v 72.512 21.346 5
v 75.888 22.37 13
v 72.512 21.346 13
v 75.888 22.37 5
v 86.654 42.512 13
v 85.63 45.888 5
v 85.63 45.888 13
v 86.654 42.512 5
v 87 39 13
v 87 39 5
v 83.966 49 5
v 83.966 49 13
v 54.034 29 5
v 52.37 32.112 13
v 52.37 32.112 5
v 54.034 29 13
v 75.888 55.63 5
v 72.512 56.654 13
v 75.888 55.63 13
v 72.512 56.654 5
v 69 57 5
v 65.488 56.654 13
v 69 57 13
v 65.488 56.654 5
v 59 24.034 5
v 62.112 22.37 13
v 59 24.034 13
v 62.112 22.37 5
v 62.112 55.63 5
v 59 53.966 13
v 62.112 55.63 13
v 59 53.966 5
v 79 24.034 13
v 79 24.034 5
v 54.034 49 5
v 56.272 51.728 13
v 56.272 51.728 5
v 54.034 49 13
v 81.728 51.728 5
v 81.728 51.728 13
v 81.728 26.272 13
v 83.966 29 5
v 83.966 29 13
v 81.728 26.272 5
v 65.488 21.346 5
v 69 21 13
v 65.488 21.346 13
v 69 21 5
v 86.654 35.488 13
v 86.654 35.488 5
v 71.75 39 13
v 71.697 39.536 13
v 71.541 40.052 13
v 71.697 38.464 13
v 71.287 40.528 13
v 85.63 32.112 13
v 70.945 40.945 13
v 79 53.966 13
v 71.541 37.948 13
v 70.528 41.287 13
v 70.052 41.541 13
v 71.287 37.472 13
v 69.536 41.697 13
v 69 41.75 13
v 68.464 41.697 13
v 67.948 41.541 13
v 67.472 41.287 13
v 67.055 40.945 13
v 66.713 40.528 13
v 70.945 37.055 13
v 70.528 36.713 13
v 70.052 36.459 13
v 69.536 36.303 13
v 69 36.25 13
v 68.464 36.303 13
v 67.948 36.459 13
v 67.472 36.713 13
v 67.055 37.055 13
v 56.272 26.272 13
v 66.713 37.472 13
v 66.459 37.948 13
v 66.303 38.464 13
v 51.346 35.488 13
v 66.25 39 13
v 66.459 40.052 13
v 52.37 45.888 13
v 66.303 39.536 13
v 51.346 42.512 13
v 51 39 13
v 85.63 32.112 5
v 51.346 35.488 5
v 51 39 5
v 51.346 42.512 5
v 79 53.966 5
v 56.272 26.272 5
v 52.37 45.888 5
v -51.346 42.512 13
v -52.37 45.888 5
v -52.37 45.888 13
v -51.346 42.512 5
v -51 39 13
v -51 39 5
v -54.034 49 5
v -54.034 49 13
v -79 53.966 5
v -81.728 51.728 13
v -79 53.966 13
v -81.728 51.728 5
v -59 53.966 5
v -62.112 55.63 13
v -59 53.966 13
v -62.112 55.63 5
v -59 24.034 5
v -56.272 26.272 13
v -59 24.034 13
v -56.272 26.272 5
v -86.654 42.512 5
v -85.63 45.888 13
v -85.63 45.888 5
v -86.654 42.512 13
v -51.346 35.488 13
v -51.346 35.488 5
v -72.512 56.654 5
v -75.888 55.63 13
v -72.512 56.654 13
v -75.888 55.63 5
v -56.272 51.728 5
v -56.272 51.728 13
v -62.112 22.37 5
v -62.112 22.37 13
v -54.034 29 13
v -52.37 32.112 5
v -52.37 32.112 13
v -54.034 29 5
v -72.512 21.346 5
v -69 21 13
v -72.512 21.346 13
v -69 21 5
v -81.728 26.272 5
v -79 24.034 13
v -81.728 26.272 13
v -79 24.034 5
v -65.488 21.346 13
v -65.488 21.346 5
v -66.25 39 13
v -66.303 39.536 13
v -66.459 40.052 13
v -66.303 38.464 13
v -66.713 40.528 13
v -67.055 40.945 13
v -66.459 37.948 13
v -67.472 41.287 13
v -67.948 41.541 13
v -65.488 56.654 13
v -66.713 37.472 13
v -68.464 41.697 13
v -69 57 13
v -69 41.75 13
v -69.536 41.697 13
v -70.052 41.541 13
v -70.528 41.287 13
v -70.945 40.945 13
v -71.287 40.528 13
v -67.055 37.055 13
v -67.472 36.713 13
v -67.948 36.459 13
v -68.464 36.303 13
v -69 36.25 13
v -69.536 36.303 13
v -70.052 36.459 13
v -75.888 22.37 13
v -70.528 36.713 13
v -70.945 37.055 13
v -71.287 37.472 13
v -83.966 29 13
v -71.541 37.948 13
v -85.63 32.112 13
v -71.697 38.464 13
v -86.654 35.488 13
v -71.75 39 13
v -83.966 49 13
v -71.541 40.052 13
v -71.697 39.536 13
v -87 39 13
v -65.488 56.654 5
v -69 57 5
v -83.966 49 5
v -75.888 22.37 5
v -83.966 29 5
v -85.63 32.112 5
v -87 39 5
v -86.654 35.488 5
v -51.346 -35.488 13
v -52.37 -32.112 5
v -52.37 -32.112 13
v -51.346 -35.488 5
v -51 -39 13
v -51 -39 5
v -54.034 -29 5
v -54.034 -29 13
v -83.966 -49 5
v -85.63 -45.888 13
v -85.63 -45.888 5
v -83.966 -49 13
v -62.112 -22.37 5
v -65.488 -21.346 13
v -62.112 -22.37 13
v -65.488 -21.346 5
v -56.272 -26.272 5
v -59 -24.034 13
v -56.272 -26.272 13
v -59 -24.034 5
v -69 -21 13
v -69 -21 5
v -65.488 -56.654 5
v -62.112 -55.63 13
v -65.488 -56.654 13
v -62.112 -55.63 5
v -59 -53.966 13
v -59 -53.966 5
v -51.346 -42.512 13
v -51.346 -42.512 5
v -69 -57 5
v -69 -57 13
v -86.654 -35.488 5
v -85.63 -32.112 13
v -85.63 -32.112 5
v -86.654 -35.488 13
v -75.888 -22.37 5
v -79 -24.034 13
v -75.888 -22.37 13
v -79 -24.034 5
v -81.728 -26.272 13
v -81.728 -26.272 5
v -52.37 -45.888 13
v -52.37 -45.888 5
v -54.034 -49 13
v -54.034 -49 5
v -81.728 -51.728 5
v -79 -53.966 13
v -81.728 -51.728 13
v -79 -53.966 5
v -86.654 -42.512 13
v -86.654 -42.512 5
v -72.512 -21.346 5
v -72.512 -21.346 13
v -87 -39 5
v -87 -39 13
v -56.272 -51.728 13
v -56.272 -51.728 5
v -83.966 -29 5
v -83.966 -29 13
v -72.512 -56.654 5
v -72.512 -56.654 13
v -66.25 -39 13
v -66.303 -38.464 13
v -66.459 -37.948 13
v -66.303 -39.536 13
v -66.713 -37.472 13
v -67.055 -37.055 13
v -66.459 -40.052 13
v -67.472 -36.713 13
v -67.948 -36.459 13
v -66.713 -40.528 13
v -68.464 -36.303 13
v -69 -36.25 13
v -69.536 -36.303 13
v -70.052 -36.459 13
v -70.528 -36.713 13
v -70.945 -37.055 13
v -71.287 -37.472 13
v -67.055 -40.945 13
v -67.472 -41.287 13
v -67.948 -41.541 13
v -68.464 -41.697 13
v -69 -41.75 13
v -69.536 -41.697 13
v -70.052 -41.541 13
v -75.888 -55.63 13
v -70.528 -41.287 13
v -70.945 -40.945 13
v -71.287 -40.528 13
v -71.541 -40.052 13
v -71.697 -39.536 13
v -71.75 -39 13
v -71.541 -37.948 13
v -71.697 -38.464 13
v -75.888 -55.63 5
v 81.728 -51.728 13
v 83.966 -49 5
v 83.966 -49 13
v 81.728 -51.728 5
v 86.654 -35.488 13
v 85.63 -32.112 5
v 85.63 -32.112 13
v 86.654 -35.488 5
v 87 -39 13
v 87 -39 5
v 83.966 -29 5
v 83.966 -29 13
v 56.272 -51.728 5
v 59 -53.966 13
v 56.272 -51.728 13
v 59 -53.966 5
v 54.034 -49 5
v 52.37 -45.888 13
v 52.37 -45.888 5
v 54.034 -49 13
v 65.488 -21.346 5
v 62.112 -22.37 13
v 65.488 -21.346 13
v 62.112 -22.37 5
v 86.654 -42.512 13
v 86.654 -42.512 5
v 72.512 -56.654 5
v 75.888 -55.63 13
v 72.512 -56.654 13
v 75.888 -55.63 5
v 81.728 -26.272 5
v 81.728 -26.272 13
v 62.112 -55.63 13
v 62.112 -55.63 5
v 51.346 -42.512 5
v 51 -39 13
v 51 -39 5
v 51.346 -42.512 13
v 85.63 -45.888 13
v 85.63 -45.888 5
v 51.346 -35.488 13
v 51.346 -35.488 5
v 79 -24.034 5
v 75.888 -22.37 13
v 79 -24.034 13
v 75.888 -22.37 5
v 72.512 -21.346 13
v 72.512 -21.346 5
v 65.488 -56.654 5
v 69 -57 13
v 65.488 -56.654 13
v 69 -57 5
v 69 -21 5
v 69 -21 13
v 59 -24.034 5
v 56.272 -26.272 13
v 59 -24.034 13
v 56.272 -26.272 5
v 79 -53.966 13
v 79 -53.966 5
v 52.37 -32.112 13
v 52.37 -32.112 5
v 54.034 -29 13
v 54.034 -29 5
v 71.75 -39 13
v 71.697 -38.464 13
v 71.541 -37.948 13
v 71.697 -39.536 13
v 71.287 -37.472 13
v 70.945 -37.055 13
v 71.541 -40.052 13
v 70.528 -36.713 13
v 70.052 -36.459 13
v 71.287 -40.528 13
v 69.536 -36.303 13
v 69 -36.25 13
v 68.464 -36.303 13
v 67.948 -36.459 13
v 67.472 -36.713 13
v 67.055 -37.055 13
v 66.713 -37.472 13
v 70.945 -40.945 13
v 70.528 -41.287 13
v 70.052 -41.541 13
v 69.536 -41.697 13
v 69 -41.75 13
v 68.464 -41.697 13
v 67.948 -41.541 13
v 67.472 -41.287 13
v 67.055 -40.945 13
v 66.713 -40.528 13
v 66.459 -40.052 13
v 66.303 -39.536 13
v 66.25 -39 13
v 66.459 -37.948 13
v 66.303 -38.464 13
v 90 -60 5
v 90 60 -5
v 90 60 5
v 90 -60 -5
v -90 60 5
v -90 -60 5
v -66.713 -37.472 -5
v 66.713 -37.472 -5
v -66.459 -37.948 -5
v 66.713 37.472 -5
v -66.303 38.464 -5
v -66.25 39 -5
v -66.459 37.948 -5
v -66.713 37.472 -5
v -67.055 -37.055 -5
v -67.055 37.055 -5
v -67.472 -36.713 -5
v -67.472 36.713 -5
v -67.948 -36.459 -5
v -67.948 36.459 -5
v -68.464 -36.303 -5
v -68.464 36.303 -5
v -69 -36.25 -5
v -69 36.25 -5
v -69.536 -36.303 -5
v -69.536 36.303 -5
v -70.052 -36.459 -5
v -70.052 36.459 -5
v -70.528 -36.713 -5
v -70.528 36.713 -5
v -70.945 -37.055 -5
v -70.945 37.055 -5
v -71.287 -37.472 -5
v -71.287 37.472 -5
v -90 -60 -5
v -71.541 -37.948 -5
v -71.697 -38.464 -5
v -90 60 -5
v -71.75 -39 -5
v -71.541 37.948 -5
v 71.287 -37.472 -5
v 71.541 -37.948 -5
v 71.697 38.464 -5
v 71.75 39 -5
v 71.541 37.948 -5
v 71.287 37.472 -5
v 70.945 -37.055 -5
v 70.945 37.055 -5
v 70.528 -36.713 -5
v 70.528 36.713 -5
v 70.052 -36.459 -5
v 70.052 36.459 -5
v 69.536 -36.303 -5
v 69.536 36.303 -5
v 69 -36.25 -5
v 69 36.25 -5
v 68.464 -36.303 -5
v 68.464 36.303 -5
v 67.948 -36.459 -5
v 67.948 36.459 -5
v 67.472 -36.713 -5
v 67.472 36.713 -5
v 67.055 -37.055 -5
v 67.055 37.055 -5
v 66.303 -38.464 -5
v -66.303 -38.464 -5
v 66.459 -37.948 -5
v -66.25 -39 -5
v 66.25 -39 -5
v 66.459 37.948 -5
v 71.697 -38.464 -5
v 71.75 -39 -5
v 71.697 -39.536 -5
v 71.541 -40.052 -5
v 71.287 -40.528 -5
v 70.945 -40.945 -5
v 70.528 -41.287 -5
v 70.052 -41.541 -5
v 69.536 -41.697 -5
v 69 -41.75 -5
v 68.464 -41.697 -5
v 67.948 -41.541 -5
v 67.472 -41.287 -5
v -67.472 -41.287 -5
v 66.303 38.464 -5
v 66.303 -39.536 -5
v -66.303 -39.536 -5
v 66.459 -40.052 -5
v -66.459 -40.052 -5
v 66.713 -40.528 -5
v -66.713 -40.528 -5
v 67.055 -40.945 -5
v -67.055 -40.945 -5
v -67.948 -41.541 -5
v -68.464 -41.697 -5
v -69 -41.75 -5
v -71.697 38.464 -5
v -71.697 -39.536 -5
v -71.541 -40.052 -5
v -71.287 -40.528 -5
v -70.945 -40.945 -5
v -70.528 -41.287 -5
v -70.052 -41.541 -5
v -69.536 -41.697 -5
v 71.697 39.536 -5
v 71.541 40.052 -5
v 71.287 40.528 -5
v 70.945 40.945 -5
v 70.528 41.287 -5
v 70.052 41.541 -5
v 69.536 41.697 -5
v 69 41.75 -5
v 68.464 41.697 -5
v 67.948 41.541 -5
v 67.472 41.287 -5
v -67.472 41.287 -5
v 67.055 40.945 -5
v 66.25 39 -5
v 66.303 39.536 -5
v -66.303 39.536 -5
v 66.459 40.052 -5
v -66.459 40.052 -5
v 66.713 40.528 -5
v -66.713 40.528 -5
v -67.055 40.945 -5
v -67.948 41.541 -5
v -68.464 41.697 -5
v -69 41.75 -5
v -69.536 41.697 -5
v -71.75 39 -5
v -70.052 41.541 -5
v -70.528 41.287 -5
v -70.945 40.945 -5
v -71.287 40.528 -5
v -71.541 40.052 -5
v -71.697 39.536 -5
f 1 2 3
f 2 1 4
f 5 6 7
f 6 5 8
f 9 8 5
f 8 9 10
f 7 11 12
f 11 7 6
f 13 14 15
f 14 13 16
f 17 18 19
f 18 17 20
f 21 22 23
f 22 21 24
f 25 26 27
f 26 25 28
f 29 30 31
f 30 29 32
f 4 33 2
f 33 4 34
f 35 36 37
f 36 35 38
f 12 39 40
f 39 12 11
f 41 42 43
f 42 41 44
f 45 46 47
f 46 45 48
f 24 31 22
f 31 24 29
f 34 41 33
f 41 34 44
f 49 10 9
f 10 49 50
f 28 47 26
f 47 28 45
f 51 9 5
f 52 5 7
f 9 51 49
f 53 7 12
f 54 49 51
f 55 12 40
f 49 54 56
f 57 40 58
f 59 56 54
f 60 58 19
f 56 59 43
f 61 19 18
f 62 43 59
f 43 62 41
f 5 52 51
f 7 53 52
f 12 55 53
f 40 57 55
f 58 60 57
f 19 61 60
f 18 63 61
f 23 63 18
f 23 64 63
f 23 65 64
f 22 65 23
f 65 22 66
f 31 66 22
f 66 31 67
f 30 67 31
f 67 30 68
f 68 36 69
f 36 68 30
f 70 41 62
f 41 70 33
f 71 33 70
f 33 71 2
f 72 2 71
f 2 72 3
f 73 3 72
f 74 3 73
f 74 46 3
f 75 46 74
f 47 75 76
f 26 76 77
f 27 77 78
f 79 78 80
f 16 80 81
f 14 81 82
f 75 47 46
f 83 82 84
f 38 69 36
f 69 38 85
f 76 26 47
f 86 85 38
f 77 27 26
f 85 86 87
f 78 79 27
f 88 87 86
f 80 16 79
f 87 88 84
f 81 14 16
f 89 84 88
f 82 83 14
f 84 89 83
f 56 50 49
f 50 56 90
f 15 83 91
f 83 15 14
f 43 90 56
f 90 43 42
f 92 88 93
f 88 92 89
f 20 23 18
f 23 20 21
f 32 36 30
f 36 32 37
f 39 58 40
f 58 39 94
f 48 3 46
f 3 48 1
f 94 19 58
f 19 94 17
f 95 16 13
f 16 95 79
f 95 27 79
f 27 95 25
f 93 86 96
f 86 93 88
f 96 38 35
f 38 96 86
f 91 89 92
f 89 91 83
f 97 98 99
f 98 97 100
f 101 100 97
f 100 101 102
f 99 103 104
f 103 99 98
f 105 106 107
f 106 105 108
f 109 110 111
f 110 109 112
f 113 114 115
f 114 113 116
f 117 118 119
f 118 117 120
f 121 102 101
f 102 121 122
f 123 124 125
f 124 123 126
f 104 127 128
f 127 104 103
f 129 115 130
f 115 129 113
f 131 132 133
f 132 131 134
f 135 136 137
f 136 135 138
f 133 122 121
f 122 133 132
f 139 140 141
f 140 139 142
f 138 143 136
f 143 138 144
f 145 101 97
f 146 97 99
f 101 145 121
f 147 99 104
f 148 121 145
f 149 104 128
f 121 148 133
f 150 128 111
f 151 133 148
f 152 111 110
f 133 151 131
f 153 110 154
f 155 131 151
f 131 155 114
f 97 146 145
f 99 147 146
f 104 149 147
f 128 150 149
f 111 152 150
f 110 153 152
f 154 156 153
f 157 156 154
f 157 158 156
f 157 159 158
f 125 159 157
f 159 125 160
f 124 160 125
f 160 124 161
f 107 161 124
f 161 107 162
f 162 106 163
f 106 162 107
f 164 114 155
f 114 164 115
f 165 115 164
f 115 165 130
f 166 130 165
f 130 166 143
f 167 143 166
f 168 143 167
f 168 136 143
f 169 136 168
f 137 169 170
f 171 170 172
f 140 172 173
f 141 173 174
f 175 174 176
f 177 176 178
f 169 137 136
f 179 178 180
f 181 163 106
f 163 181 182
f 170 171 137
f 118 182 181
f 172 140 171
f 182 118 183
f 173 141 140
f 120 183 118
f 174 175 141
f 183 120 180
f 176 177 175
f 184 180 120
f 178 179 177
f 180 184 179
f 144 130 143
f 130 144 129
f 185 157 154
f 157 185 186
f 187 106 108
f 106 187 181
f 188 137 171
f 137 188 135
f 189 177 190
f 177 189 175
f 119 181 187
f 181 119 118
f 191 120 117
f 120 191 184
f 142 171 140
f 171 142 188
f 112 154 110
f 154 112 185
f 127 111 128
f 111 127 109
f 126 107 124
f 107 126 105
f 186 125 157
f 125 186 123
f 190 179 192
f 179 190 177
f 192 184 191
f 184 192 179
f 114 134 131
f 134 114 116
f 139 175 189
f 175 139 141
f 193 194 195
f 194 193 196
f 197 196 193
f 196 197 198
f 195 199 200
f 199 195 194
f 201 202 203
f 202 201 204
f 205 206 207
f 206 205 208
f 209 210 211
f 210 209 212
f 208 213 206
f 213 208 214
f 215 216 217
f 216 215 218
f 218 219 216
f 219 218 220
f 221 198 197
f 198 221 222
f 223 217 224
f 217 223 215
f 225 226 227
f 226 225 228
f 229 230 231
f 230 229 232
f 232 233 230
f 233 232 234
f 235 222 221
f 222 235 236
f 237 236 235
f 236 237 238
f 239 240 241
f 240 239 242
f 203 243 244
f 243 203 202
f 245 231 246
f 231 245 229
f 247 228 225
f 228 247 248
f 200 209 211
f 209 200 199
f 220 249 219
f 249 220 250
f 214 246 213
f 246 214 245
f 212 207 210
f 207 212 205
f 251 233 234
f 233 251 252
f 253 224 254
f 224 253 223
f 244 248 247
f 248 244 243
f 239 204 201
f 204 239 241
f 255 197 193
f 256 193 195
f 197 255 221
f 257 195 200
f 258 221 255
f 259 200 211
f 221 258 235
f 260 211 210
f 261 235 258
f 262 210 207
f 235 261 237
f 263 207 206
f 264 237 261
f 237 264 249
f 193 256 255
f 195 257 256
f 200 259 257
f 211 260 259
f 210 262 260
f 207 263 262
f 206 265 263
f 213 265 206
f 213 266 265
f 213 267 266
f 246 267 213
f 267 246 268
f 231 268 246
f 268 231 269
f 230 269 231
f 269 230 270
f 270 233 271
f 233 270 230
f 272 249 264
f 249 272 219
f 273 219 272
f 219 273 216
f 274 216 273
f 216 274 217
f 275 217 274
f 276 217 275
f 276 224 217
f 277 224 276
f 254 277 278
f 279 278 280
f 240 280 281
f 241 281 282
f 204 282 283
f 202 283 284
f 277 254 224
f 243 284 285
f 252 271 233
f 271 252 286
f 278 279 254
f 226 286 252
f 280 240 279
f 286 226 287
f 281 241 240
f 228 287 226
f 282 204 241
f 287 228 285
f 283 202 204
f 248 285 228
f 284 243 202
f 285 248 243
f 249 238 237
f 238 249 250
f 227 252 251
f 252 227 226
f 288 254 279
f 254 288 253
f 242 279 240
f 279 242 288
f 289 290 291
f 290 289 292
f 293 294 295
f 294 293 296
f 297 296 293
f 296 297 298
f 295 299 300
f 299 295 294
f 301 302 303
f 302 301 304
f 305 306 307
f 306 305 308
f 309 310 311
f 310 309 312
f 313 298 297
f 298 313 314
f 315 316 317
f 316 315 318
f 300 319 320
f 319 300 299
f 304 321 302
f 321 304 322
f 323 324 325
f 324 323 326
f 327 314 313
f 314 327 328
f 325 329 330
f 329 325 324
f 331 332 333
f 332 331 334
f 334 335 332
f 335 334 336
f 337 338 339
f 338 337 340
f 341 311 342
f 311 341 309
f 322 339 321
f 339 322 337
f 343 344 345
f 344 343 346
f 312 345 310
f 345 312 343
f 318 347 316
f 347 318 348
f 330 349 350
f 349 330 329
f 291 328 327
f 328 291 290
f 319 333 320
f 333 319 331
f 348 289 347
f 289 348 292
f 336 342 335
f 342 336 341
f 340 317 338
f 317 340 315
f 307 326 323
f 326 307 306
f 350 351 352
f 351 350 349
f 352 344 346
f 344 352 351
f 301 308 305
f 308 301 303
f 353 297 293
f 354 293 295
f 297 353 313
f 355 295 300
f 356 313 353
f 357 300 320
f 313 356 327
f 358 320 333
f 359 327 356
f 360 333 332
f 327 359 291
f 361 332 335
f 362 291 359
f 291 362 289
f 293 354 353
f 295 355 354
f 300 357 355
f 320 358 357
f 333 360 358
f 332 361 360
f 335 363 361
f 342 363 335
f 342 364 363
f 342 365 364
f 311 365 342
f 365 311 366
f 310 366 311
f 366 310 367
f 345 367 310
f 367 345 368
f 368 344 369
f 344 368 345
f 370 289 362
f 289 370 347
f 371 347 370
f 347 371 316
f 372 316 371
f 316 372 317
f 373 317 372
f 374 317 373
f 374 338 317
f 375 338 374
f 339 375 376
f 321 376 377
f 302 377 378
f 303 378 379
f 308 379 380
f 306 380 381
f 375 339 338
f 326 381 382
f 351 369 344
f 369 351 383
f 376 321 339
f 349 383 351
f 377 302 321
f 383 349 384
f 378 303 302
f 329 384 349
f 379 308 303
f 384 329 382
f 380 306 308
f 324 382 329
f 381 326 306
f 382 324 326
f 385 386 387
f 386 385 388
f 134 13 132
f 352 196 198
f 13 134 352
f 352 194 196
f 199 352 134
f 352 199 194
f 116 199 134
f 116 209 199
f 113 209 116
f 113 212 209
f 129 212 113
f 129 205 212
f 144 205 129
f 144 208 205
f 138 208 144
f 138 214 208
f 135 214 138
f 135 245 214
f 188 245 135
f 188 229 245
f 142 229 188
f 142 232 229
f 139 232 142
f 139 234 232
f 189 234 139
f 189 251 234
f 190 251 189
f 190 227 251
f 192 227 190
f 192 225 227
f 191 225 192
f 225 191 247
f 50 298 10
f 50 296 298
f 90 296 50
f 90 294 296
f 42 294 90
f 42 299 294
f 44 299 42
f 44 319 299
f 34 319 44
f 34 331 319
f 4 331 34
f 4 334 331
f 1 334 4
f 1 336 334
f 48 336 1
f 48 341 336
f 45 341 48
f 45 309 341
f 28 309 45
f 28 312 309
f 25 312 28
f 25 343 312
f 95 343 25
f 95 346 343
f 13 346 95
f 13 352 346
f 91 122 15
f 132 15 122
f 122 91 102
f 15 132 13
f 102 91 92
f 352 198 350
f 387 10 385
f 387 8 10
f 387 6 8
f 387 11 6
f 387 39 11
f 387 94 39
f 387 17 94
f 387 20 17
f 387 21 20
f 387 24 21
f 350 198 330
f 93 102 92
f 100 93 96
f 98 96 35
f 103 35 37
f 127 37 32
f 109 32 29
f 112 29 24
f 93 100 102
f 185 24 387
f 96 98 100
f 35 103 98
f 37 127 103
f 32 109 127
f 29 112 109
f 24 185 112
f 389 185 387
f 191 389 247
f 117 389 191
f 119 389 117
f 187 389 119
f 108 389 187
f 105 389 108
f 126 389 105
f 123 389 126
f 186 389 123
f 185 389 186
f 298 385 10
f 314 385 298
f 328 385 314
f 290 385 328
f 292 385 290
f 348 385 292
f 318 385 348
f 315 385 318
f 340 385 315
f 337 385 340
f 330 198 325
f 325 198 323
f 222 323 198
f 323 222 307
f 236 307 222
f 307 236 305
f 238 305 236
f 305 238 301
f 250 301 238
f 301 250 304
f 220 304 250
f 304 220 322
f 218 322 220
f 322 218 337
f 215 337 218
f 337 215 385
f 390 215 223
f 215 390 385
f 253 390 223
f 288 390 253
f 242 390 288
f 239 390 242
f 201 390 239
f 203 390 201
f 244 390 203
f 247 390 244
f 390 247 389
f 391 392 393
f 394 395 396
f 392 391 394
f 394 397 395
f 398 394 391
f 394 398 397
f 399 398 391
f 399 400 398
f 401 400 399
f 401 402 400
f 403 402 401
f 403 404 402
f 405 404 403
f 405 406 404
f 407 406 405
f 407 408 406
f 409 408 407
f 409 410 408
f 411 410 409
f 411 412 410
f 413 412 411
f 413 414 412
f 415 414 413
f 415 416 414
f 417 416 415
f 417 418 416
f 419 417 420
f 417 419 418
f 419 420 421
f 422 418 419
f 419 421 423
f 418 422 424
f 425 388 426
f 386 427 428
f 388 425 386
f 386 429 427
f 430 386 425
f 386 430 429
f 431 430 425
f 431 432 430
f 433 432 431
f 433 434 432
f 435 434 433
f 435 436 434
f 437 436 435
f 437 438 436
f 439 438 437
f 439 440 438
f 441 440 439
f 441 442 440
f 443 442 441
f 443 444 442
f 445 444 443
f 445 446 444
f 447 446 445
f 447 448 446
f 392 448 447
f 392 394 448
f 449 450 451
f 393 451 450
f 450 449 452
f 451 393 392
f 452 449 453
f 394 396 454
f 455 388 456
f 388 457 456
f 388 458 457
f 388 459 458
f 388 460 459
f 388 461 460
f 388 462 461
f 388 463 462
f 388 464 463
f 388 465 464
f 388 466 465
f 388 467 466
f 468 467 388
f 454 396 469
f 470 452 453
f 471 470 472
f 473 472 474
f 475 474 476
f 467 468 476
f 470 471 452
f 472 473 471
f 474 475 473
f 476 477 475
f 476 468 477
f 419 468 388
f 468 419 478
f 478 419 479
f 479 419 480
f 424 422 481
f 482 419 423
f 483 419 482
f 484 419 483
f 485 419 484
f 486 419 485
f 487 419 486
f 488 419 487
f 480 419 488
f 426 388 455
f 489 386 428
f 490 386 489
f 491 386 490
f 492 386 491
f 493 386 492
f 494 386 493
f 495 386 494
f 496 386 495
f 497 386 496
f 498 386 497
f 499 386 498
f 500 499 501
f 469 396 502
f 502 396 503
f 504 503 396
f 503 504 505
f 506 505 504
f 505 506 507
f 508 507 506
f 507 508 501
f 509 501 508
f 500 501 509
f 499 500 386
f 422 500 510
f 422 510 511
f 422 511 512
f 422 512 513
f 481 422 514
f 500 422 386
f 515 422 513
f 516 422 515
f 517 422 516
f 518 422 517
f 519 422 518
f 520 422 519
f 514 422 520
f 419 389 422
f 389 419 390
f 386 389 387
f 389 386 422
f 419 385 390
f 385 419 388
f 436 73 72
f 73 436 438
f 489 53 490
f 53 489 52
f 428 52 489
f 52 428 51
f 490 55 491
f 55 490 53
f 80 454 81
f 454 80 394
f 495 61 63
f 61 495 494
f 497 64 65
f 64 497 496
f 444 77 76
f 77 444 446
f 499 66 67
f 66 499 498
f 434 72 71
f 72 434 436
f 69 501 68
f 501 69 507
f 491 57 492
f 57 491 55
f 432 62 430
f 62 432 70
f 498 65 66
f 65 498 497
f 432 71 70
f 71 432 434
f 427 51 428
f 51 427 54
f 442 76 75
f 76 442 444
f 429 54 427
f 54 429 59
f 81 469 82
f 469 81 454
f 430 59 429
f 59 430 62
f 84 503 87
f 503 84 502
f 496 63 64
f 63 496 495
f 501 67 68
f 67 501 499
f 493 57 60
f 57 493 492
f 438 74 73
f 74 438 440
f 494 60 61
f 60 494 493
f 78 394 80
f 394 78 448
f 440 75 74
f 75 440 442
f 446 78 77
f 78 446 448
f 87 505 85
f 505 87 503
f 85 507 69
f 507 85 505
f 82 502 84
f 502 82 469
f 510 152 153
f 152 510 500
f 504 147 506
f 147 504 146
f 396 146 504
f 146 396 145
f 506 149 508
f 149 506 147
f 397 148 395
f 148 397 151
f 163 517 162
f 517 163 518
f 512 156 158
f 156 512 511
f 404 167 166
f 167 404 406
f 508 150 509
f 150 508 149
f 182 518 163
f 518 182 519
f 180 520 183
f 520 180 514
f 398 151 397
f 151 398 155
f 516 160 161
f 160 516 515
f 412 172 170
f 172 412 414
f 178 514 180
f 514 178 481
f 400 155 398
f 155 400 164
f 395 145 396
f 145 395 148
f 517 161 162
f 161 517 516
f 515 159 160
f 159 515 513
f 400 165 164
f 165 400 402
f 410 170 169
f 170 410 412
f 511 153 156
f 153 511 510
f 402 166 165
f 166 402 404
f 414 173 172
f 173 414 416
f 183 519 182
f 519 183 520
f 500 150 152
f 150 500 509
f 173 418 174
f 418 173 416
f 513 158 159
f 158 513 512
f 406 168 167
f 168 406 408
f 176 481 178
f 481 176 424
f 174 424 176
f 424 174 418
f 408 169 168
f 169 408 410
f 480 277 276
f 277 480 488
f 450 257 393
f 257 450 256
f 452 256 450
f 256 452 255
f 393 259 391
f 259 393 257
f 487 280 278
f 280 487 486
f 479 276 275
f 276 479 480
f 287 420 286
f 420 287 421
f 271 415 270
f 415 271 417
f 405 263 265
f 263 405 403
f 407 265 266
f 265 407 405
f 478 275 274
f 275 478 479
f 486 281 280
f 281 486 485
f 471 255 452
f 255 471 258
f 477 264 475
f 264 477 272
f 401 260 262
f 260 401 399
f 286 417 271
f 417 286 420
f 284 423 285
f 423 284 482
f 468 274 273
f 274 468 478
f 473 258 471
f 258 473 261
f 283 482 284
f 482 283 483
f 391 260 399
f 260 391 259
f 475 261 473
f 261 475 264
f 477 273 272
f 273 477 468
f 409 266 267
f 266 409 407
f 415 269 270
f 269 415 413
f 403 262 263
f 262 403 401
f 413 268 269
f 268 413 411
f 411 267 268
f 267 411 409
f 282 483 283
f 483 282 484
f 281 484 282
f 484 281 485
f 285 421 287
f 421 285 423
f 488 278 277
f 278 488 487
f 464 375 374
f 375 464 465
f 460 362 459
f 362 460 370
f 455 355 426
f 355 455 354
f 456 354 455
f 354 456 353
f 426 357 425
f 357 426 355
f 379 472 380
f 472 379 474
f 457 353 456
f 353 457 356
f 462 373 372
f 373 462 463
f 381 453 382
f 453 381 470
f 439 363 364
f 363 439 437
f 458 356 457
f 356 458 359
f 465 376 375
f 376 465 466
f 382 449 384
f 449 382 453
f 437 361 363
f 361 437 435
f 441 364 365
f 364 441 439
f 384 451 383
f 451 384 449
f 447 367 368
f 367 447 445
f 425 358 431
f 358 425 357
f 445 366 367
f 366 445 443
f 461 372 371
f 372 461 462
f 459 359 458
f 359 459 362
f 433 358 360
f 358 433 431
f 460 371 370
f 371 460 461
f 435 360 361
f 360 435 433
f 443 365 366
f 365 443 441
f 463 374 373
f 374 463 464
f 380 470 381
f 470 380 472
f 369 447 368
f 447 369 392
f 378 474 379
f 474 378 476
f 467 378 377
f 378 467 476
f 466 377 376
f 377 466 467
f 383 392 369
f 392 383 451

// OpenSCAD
$fn = 32;

// ----------------------------------------------------------------------
// Anchor pads 180 x 120 x 18
// four corner bosses with anchor holes
// ----------------------------------------------------------------------

// --- parameters (mm) ---
plate = [180, 120, 10];  // base plate size (x, y, z)
pads = 4;                // boss count, one per corner
edge = 21;               // boss centre offset from the plate edge
boss_d = 36;             // boss diameter
boss_h = 8;              // boss height above the base plate
hole_d = 5.5;            // hole diameter

// --- derived feature positions (mm) ---
height = plate[2] + boss_h;      // = 18   overall height of the part
corner_x = plate[0] / 2 - edge;  // = 69   boss centre X
corner_y = plate[1] / 2 - edge;  // = 39   boss centre Y
feature_centers = [
  [corner_x, corner_y],
  [-corner_x, corner_y],
  [-corner_x, -corner_y],
  [corner_x, -corner_y]
];   // boss centres, anchor holes are drilled there

// base plate, four bosses standing on it, anchor holes all the way through
difference() {
  union() {
    cube(plate, center = true);
    for (centre = feature_centers)
      translate([centre[0], centre[1], plate[2] / 2 - 1])
        cylinder(d = boss_d, h = boss_h + 1);
  }
  for (centre = feature_centers)
    translate([centre[0], centre[1], -height])
      cylinder(d = hole_d, h = 2 * height + 2);  // through boss and plate
}
